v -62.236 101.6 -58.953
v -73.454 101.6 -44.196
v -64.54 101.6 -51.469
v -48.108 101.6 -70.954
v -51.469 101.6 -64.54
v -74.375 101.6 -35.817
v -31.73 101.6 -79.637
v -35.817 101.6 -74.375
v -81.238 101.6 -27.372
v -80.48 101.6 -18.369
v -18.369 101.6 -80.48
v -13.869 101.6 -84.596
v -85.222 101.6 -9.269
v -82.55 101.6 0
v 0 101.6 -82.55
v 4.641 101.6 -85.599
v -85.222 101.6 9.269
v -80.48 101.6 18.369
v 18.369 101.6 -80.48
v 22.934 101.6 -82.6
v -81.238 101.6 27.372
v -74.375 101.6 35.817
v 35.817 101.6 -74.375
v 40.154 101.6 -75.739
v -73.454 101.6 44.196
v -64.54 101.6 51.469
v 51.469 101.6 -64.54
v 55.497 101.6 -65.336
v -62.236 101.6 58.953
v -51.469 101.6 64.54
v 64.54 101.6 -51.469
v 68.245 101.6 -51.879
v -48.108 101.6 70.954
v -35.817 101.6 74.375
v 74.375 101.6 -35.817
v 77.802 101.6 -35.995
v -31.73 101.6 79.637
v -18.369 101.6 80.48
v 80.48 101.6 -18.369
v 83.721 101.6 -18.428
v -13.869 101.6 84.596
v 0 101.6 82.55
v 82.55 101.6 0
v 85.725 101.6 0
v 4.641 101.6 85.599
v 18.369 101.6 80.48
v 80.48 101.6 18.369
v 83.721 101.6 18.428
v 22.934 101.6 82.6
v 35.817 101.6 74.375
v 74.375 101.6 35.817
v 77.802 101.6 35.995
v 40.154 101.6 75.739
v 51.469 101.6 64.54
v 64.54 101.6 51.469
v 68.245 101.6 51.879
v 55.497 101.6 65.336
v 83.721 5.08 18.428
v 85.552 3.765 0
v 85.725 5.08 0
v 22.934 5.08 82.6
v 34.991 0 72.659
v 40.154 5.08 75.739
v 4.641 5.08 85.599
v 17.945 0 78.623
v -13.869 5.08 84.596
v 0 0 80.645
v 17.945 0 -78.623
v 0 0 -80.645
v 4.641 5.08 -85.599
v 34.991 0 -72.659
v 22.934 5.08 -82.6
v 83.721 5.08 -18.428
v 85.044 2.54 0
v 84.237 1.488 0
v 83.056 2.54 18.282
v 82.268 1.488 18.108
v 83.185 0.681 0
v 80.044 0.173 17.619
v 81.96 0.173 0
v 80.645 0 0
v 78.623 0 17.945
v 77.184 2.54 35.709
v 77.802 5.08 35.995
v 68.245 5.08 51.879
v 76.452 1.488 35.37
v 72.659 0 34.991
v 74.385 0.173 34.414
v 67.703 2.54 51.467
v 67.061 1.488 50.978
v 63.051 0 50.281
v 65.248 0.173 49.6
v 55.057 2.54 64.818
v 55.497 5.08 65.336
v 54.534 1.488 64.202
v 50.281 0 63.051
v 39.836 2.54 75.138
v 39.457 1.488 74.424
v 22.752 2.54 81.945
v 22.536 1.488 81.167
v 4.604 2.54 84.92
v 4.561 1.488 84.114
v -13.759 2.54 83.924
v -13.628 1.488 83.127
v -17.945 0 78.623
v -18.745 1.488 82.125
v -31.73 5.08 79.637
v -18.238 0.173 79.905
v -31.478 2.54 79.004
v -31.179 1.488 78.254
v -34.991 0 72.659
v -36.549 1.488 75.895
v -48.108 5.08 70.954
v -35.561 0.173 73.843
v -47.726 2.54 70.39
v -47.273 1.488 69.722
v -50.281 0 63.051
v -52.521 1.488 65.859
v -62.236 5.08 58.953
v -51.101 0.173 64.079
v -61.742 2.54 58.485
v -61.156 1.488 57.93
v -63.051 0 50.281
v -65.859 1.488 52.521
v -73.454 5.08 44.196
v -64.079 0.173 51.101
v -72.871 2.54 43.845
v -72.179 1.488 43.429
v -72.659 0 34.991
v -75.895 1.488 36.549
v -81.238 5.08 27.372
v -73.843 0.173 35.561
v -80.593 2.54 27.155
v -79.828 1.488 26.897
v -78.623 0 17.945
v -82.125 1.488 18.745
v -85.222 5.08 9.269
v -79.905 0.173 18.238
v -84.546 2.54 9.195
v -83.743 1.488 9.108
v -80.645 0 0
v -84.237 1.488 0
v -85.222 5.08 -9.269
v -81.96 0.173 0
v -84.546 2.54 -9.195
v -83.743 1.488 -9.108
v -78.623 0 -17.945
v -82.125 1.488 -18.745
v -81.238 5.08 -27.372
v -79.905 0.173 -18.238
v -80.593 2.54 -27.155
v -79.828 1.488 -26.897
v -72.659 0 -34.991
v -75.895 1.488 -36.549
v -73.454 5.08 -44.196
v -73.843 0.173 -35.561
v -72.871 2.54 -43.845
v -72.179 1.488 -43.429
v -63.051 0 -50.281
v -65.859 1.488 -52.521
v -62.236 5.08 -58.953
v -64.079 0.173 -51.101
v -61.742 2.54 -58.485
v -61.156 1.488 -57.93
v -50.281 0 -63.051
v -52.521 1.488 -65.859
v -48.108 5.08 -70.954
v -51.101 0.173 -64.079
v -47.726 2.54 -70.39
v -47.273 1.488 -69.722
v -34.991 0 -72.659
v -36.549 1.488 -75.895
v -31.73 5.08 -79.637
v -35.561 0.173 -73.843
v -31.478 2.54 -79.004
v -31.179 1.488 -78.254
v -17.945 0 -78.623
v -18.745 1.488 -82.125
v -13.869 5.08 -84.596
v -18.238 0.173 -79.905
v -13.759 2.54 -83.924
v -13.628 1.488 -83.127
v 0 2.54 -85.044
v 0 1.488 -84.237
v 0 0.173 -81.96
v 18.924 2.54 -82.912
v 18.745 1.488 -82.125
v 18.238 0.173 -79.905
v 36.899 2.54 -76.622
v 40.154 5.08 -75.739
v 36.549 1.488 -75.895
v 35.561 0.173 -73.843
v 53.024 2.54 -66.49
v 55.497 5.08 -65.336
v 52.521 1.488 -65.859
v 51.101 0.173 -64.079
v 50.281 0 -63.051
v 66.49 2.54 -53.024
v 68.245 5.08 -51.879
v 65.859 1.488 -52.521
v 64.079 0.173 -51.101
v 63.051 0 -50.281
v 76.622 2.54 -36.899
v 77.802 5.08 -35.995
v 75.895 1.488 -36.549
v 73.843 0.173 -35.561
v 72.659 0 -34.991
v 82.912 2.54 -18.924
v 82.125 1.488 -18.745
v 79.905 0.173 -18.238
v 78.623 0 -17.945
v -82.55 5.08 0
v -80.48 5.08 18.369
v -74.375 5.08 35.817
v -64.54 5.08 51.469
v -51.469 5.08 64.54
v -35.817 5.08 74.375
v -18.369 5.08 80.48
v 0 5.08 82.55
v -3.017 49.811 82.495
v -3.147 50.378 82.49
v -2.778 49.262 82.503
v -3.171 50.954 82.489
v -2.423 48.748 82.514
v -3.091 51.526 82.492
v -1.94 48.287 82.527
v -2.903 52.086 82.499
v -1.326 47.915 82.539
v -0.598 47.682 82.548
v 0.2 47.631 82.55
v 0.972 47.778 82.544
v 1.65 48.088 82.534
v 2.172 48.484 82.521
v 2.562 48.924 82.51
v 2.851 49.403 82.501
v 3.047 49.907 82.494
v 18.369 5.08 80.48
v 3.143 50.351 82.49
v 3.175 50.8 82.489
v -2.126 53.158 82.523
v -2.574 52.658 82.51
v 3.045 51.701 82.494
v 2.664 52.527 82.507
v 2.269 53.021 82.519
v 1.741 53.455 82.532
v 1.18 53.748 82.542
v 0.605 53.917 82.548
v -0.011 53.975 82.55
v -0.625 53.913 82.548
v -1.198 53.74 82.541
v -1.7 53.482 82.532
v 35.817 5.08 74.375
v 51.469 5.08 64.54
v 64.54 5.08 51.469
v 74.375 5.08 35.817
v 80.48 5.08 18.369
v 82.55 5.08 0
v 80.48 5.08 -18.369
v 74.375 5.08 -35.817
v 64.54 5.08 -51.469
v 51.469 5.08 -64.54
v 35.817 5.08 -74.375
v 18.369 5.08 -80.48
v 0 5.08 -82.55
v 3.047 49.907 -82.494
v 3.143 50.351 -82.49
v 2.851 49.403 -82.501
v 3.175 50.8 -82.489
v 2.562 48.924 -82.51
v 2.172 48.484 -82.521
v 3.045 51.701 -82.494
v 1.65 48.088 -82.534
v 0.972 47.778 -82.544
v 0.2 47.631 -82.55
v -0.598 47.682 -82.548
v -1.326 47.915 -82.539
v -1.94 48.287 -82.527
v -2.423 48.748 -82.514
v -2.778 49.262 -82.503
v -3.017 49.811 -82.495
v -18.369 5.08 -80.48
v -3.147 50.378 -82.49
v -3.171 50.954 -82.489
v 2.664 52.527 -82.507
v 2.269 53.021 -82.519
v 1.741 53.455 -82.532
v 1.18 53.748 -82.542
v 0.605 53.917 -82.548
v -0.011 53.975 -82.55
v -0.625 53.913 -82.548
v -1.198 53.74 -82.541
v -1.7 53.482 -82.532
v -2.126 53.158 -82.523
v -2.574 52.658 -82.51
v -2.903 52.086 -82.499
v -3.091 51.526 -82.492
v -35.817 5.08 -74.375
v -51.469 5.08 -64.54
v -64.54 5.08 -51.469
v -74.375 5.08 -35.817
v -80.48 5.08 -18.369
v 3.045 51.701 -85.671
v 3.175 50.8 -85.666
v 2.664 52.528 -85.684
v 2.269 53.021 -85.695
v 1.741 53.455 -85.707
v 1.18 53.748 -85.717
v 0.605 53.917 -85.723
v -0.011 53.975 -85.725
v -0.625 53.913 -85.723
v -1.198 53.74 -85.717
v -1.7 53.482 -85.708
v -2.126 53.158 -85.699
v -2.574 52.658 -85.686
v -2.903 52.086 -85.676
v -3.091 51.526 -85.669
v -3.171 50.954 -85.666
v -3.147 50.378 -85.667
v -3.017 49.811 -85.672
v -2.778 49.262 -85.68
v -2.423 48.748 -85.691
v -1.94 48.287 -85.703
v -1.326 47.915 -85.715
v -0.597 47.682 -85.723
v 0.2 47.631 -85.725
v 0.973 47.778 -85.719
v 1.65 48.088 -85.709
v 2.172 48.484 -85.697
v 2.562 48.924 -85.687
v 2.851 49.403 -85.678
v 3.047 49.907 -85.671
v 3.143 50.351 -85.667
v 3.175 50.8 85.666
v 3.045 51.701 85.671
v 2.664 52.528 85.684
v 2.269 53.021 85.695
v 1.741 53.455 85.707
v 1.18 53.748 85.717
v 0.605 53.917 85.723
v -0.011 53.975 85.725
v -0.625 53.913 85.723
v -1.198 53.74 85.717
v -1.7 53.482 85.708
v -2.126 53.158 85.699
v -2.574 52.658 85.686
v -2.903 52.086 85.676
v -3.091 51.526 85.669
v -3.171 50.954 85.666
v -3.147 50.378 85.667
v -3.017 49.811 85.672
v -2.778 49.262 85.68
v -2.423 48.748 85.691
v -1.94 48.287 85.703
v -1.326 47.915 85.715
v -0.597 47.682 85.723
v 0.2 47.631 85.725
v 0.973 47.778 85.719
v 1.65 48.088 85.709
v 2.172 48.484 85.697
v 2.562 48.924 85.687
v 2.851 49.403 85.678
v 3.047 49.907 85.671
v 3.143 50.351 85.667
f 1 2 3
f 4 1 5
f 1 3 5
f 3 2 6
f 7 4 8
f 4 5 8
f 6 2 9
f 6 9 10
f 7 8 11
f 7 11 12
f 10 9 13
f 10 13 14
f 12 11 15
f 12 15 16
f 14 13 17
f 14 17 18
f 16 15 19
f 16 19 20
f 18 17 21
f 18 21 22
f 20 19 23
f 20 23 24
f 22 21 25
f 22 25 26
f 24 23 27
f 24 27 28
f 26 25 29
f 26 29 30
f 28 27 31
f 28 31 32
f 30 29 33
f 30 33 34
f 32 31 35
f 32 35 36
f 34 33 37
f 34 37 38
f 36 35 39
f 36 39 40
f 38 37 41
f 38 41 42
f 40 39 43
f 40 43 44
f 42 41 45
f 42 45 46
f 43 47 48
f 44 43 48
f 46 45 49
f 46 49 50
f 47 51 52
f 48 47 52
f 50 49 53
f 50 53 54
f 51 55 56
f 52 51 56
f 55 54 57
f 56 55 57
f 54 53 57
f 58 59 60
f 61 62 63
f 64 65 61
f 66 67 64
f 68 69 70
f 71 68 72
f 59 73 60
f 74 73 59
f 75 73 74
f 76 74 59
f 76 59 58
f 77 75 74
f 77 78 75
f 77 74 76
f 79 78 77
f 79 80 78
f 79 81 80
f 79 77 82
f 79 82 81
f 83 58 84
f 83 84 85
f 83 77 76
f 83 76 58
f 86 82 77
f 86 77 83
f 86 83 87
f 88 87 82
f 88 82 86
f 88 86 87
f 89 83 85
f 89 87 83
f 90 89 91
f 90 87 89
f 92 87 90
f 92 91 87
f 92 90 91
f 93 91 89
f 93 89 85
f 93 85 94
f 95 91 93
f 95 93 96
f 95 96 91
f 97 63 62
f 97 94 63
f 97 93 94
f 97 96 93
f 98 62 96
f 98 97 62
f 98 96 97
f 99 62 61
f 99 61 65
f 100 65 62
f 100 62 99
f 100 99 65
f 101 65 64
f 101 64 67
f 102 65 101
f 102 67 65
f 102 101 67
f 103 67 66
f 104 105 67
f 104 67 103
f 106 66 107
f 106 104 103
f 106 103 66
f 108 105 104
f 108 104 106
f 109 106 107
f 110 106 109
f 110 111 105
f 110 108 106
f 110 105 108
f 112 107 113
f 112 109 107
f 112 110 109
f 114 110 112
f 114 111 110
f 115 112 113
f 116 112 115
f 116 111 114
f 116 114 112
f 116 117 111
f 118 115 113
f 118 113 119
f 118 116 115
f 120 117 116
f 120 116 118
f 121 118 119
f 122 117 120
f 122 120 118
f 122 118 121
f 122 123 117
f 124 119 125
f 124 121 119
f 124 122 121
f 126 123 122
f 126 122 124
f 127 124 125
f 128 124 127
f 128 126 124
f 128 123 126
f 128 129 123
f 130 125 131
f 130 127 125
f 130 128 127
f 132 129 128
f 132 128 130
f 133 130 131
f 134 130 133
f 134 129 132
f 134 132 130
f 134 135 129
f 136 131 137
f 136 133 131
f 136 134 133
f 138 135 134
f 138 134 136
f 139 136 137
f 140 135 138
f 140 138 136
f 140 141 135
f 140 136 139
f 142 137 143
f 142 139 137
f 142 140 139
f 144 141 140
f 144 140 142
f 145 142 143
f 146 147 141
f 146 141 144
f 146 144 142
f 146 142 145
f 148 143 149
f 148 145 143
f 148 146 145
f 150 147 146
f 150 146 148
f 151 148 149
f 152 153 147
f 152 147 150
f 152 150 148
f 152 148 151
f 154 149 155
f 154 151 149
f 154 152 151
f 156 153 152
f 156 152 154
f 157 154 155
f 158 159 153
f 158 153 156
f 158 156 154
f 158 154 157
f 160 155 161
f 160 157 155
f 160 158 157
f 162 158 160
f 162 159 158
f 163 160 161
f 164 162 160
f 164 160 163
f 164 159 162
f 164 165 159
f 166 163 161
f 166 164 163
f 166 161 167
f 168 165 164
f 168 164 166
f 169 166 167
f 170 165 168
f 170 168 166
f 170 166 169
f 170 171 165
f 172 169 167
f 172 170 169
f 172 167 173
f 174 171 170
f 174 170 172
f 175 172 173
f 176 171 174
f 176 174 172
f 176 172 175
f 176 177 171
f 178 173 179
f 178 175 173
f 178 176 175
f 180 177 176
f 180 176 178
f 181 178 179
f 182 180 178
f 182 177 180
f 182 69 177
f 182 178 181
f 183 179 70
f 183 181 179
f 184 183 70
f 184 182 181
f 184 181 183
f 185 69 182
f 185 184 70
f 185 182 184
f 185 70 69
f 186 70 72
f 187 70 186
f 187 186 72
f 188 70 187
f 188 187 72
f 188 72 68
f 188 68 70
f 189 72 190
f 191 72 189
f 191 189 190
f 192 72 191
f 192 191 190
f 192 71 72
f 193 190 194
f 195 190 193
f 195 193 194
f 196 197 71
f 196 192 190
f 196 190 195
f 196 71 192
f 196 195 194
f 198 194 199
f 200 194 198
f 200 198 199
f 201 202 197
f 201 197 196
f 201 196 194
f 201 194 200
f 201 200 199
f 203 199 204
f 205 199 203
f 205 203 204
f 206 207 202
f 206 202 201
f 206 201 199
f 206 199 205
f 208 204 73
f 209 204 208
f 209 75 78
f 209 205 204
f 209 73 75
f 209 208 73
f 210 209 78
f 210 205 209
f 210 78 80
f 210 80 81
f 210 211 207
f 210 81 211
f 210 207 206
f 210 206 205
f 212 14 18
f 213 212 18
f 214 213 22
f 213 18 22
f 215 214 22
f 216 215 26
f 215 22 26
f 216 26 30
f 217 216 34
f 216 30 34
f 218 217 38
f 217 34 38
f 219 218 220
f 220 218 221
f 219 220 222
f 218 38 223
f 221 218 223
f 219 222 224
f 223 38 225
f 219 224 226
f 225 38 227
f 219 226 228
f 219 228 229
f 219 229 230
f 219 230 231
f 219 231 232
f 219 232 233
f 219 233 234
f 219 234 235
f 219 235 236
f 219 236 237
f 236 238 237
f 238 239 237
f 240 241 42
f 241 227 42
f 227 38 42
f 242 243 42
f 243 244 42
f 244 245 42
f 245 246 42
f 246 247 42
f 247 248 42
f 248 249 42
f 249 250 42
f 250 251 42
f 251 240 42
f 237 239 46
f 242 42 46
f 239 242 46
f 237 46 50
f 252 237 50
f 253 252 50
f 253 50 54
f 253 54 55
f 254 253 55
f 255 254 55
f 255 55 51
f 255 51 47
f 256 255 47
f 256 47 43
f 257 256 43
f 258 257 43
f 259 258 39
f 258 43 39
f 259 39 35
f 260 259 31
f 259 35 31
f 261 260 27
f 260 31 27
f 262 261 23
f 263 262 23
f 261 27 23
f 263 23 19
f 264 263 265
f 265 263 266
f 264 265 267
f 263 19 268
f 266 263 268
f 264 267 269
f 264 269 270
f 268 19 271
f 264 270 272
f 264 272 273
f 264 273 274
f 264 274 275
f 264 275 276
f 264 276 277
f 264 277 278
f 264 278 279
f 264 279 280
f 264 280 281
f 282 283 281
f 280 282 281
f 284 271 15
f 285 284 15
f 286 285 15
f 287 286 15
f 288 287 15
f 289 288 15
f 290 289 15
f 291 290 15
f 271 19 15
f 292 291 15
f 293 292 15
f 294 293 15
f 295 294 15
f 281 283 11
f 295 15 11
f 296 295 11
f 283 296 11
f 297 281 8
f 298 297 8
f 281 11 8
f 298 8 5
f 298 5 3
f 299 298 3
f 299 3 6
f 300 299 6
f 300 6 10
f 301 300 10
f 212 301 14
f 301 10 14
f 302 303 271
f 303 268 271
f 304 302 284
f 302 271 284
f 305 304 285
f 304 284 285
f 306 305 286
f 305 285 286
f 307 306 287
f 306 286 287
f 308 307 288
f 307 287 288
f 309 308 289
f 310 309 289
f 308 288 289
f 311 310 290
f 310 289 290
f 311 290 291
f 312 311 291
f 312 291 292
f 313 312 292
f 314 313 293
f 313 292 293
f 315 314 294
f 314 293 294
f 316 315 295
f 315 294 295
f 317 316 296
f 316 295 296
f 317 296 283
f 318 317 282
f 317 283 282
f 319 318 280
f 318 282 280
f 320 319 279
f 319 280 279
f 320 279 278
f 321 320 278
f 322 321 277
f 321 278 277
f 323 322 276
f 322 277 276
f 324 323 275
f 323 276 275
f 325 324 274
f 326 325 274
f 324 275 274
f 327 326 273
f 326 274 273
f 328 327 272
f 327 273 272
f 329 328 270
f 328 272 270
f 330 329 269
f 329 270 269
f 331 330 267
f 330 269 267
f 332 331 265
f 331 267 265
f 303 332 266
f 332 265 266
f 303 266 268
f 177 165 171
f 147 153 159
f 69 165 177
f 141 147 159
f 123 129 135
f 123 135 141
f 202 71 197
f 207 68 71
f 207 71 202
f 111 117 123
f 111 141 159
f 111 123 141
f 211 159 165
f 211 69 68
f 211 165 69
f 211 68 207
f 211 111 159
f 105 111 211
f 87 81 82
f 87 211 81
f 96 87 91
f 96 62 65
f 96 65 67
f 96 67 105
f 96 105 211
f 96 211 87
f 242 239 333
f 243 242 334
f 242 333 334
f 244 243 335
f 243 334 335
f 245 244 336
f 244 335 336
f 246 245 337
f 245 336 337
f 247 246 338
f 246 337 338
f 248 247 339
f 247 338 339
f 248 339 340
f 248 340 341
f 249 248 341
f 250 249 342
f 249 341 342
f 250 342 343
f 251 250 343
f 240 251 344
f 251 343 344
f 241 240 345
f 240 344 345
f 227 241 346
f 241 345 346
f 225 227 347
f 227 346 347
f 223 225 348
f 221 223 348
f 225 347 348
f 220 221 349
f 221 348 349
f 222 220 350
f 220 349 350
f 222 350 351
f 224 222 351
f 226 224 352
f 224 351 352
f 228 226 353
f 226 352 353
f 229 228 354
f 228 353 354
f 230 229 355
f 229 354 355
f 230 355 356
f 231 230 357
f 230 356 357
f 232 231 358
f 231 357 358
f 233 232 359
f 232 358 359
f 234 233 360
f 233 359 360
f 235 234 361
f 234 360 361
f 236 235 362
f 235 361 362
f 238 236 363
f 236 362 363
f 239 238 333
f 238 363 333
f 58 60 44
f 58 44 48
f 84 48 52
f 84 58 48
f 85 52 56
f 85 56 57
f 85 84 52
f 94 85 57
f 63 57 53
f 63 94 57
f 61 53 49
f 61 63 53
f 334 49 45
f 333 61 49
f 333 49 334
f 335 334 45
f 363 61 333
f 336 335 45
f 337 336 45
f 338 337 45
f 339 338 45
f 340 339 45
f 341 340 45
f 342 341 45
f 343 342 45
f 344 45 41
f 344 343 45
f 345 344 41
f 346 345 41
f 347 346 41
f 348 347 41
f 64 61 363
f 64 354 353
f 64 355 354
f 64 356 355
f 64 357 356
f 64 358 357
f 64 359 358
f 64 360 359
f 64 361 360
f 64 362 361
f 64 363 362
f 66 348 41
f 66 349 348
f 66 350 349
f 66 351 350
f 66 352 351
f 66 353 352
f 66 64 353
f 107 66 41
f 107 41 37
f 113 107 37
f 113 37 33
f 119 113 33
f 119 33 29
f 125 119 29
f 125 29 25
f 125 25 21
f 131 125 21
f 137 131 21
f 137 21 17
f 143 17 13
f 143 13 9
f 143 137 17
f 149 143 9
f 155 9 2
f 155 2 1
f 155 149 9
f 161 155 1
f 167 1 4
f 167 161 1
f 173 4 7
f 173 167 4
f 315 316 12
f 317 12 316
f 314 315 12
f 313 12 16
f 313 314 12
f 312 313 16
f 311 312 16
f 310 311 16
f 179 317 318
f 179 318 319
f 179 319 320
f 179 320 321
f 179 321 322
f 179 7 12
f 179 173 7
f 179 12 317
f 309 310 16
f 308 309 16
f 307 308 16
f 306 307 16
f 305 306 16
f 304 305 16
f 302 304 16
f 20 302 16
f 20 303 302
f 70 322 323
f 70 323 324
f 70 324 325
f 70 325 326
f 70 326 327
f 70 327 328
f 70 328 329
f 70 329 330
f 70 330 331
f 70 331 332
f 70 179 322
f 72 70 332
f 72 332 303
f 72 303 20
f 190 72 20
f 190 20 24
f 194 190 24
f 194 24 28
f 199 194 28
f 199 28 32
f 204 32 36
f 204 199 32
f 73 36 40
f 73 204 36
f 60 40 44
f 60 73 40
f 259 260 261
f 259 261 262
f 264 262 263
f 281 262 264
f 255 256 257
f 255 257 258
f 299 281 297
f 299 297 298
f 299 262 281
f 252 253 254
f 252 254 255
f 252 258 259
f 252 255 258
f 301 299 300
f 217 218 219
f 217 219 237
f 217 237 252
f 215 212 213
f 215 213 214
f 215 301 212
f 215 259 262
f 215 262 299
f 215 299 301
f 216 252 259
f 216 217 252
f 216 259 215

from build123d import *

# Parameters (mm, degrees)
F0_R     = 85.725
F1_DEPTH = 101.6
F2_R     = 82.55
F3_DEPTH = 96.52
F4_R     = 5.08
F5_R     = 3.175
F6_DEPTH = 254


with BuildPart() as f1:
    # F0 (on Front) → F1 (new body)
    with BuildSketch(Plane.XZ):
        Circle(F0_R)
    extrude(amount=-F1_DEPTH)

    # F2 (on face) → F3 (cut)
    with BuildSketch(Plane(origin=(0, 101.6, 0), x_dir=(-1, 0, 0), z_dir=(0, 1, 0))):
        Circle(F2_R)
    extrude(amount=-F3_DEPTH, mode=Mode.SUBTRACT)

    # F4
    f4_edges = [f1.edges().sort_by_distance(p)[0] for p in [
        (-85.725, 0, 0),
    ]]
    fillet(f4_edges, radius=F4_R)

    # F5 (on Top) → F6 (cut, symmetric)
    with BuildSketch(Plane.XY):
        with Locations((0, 50.8)):
            Circle(F5_R)
    extrude(amount=F6_DEPTH, both=True, mode=Mode.SUBTRACT)


solid = f1.part
